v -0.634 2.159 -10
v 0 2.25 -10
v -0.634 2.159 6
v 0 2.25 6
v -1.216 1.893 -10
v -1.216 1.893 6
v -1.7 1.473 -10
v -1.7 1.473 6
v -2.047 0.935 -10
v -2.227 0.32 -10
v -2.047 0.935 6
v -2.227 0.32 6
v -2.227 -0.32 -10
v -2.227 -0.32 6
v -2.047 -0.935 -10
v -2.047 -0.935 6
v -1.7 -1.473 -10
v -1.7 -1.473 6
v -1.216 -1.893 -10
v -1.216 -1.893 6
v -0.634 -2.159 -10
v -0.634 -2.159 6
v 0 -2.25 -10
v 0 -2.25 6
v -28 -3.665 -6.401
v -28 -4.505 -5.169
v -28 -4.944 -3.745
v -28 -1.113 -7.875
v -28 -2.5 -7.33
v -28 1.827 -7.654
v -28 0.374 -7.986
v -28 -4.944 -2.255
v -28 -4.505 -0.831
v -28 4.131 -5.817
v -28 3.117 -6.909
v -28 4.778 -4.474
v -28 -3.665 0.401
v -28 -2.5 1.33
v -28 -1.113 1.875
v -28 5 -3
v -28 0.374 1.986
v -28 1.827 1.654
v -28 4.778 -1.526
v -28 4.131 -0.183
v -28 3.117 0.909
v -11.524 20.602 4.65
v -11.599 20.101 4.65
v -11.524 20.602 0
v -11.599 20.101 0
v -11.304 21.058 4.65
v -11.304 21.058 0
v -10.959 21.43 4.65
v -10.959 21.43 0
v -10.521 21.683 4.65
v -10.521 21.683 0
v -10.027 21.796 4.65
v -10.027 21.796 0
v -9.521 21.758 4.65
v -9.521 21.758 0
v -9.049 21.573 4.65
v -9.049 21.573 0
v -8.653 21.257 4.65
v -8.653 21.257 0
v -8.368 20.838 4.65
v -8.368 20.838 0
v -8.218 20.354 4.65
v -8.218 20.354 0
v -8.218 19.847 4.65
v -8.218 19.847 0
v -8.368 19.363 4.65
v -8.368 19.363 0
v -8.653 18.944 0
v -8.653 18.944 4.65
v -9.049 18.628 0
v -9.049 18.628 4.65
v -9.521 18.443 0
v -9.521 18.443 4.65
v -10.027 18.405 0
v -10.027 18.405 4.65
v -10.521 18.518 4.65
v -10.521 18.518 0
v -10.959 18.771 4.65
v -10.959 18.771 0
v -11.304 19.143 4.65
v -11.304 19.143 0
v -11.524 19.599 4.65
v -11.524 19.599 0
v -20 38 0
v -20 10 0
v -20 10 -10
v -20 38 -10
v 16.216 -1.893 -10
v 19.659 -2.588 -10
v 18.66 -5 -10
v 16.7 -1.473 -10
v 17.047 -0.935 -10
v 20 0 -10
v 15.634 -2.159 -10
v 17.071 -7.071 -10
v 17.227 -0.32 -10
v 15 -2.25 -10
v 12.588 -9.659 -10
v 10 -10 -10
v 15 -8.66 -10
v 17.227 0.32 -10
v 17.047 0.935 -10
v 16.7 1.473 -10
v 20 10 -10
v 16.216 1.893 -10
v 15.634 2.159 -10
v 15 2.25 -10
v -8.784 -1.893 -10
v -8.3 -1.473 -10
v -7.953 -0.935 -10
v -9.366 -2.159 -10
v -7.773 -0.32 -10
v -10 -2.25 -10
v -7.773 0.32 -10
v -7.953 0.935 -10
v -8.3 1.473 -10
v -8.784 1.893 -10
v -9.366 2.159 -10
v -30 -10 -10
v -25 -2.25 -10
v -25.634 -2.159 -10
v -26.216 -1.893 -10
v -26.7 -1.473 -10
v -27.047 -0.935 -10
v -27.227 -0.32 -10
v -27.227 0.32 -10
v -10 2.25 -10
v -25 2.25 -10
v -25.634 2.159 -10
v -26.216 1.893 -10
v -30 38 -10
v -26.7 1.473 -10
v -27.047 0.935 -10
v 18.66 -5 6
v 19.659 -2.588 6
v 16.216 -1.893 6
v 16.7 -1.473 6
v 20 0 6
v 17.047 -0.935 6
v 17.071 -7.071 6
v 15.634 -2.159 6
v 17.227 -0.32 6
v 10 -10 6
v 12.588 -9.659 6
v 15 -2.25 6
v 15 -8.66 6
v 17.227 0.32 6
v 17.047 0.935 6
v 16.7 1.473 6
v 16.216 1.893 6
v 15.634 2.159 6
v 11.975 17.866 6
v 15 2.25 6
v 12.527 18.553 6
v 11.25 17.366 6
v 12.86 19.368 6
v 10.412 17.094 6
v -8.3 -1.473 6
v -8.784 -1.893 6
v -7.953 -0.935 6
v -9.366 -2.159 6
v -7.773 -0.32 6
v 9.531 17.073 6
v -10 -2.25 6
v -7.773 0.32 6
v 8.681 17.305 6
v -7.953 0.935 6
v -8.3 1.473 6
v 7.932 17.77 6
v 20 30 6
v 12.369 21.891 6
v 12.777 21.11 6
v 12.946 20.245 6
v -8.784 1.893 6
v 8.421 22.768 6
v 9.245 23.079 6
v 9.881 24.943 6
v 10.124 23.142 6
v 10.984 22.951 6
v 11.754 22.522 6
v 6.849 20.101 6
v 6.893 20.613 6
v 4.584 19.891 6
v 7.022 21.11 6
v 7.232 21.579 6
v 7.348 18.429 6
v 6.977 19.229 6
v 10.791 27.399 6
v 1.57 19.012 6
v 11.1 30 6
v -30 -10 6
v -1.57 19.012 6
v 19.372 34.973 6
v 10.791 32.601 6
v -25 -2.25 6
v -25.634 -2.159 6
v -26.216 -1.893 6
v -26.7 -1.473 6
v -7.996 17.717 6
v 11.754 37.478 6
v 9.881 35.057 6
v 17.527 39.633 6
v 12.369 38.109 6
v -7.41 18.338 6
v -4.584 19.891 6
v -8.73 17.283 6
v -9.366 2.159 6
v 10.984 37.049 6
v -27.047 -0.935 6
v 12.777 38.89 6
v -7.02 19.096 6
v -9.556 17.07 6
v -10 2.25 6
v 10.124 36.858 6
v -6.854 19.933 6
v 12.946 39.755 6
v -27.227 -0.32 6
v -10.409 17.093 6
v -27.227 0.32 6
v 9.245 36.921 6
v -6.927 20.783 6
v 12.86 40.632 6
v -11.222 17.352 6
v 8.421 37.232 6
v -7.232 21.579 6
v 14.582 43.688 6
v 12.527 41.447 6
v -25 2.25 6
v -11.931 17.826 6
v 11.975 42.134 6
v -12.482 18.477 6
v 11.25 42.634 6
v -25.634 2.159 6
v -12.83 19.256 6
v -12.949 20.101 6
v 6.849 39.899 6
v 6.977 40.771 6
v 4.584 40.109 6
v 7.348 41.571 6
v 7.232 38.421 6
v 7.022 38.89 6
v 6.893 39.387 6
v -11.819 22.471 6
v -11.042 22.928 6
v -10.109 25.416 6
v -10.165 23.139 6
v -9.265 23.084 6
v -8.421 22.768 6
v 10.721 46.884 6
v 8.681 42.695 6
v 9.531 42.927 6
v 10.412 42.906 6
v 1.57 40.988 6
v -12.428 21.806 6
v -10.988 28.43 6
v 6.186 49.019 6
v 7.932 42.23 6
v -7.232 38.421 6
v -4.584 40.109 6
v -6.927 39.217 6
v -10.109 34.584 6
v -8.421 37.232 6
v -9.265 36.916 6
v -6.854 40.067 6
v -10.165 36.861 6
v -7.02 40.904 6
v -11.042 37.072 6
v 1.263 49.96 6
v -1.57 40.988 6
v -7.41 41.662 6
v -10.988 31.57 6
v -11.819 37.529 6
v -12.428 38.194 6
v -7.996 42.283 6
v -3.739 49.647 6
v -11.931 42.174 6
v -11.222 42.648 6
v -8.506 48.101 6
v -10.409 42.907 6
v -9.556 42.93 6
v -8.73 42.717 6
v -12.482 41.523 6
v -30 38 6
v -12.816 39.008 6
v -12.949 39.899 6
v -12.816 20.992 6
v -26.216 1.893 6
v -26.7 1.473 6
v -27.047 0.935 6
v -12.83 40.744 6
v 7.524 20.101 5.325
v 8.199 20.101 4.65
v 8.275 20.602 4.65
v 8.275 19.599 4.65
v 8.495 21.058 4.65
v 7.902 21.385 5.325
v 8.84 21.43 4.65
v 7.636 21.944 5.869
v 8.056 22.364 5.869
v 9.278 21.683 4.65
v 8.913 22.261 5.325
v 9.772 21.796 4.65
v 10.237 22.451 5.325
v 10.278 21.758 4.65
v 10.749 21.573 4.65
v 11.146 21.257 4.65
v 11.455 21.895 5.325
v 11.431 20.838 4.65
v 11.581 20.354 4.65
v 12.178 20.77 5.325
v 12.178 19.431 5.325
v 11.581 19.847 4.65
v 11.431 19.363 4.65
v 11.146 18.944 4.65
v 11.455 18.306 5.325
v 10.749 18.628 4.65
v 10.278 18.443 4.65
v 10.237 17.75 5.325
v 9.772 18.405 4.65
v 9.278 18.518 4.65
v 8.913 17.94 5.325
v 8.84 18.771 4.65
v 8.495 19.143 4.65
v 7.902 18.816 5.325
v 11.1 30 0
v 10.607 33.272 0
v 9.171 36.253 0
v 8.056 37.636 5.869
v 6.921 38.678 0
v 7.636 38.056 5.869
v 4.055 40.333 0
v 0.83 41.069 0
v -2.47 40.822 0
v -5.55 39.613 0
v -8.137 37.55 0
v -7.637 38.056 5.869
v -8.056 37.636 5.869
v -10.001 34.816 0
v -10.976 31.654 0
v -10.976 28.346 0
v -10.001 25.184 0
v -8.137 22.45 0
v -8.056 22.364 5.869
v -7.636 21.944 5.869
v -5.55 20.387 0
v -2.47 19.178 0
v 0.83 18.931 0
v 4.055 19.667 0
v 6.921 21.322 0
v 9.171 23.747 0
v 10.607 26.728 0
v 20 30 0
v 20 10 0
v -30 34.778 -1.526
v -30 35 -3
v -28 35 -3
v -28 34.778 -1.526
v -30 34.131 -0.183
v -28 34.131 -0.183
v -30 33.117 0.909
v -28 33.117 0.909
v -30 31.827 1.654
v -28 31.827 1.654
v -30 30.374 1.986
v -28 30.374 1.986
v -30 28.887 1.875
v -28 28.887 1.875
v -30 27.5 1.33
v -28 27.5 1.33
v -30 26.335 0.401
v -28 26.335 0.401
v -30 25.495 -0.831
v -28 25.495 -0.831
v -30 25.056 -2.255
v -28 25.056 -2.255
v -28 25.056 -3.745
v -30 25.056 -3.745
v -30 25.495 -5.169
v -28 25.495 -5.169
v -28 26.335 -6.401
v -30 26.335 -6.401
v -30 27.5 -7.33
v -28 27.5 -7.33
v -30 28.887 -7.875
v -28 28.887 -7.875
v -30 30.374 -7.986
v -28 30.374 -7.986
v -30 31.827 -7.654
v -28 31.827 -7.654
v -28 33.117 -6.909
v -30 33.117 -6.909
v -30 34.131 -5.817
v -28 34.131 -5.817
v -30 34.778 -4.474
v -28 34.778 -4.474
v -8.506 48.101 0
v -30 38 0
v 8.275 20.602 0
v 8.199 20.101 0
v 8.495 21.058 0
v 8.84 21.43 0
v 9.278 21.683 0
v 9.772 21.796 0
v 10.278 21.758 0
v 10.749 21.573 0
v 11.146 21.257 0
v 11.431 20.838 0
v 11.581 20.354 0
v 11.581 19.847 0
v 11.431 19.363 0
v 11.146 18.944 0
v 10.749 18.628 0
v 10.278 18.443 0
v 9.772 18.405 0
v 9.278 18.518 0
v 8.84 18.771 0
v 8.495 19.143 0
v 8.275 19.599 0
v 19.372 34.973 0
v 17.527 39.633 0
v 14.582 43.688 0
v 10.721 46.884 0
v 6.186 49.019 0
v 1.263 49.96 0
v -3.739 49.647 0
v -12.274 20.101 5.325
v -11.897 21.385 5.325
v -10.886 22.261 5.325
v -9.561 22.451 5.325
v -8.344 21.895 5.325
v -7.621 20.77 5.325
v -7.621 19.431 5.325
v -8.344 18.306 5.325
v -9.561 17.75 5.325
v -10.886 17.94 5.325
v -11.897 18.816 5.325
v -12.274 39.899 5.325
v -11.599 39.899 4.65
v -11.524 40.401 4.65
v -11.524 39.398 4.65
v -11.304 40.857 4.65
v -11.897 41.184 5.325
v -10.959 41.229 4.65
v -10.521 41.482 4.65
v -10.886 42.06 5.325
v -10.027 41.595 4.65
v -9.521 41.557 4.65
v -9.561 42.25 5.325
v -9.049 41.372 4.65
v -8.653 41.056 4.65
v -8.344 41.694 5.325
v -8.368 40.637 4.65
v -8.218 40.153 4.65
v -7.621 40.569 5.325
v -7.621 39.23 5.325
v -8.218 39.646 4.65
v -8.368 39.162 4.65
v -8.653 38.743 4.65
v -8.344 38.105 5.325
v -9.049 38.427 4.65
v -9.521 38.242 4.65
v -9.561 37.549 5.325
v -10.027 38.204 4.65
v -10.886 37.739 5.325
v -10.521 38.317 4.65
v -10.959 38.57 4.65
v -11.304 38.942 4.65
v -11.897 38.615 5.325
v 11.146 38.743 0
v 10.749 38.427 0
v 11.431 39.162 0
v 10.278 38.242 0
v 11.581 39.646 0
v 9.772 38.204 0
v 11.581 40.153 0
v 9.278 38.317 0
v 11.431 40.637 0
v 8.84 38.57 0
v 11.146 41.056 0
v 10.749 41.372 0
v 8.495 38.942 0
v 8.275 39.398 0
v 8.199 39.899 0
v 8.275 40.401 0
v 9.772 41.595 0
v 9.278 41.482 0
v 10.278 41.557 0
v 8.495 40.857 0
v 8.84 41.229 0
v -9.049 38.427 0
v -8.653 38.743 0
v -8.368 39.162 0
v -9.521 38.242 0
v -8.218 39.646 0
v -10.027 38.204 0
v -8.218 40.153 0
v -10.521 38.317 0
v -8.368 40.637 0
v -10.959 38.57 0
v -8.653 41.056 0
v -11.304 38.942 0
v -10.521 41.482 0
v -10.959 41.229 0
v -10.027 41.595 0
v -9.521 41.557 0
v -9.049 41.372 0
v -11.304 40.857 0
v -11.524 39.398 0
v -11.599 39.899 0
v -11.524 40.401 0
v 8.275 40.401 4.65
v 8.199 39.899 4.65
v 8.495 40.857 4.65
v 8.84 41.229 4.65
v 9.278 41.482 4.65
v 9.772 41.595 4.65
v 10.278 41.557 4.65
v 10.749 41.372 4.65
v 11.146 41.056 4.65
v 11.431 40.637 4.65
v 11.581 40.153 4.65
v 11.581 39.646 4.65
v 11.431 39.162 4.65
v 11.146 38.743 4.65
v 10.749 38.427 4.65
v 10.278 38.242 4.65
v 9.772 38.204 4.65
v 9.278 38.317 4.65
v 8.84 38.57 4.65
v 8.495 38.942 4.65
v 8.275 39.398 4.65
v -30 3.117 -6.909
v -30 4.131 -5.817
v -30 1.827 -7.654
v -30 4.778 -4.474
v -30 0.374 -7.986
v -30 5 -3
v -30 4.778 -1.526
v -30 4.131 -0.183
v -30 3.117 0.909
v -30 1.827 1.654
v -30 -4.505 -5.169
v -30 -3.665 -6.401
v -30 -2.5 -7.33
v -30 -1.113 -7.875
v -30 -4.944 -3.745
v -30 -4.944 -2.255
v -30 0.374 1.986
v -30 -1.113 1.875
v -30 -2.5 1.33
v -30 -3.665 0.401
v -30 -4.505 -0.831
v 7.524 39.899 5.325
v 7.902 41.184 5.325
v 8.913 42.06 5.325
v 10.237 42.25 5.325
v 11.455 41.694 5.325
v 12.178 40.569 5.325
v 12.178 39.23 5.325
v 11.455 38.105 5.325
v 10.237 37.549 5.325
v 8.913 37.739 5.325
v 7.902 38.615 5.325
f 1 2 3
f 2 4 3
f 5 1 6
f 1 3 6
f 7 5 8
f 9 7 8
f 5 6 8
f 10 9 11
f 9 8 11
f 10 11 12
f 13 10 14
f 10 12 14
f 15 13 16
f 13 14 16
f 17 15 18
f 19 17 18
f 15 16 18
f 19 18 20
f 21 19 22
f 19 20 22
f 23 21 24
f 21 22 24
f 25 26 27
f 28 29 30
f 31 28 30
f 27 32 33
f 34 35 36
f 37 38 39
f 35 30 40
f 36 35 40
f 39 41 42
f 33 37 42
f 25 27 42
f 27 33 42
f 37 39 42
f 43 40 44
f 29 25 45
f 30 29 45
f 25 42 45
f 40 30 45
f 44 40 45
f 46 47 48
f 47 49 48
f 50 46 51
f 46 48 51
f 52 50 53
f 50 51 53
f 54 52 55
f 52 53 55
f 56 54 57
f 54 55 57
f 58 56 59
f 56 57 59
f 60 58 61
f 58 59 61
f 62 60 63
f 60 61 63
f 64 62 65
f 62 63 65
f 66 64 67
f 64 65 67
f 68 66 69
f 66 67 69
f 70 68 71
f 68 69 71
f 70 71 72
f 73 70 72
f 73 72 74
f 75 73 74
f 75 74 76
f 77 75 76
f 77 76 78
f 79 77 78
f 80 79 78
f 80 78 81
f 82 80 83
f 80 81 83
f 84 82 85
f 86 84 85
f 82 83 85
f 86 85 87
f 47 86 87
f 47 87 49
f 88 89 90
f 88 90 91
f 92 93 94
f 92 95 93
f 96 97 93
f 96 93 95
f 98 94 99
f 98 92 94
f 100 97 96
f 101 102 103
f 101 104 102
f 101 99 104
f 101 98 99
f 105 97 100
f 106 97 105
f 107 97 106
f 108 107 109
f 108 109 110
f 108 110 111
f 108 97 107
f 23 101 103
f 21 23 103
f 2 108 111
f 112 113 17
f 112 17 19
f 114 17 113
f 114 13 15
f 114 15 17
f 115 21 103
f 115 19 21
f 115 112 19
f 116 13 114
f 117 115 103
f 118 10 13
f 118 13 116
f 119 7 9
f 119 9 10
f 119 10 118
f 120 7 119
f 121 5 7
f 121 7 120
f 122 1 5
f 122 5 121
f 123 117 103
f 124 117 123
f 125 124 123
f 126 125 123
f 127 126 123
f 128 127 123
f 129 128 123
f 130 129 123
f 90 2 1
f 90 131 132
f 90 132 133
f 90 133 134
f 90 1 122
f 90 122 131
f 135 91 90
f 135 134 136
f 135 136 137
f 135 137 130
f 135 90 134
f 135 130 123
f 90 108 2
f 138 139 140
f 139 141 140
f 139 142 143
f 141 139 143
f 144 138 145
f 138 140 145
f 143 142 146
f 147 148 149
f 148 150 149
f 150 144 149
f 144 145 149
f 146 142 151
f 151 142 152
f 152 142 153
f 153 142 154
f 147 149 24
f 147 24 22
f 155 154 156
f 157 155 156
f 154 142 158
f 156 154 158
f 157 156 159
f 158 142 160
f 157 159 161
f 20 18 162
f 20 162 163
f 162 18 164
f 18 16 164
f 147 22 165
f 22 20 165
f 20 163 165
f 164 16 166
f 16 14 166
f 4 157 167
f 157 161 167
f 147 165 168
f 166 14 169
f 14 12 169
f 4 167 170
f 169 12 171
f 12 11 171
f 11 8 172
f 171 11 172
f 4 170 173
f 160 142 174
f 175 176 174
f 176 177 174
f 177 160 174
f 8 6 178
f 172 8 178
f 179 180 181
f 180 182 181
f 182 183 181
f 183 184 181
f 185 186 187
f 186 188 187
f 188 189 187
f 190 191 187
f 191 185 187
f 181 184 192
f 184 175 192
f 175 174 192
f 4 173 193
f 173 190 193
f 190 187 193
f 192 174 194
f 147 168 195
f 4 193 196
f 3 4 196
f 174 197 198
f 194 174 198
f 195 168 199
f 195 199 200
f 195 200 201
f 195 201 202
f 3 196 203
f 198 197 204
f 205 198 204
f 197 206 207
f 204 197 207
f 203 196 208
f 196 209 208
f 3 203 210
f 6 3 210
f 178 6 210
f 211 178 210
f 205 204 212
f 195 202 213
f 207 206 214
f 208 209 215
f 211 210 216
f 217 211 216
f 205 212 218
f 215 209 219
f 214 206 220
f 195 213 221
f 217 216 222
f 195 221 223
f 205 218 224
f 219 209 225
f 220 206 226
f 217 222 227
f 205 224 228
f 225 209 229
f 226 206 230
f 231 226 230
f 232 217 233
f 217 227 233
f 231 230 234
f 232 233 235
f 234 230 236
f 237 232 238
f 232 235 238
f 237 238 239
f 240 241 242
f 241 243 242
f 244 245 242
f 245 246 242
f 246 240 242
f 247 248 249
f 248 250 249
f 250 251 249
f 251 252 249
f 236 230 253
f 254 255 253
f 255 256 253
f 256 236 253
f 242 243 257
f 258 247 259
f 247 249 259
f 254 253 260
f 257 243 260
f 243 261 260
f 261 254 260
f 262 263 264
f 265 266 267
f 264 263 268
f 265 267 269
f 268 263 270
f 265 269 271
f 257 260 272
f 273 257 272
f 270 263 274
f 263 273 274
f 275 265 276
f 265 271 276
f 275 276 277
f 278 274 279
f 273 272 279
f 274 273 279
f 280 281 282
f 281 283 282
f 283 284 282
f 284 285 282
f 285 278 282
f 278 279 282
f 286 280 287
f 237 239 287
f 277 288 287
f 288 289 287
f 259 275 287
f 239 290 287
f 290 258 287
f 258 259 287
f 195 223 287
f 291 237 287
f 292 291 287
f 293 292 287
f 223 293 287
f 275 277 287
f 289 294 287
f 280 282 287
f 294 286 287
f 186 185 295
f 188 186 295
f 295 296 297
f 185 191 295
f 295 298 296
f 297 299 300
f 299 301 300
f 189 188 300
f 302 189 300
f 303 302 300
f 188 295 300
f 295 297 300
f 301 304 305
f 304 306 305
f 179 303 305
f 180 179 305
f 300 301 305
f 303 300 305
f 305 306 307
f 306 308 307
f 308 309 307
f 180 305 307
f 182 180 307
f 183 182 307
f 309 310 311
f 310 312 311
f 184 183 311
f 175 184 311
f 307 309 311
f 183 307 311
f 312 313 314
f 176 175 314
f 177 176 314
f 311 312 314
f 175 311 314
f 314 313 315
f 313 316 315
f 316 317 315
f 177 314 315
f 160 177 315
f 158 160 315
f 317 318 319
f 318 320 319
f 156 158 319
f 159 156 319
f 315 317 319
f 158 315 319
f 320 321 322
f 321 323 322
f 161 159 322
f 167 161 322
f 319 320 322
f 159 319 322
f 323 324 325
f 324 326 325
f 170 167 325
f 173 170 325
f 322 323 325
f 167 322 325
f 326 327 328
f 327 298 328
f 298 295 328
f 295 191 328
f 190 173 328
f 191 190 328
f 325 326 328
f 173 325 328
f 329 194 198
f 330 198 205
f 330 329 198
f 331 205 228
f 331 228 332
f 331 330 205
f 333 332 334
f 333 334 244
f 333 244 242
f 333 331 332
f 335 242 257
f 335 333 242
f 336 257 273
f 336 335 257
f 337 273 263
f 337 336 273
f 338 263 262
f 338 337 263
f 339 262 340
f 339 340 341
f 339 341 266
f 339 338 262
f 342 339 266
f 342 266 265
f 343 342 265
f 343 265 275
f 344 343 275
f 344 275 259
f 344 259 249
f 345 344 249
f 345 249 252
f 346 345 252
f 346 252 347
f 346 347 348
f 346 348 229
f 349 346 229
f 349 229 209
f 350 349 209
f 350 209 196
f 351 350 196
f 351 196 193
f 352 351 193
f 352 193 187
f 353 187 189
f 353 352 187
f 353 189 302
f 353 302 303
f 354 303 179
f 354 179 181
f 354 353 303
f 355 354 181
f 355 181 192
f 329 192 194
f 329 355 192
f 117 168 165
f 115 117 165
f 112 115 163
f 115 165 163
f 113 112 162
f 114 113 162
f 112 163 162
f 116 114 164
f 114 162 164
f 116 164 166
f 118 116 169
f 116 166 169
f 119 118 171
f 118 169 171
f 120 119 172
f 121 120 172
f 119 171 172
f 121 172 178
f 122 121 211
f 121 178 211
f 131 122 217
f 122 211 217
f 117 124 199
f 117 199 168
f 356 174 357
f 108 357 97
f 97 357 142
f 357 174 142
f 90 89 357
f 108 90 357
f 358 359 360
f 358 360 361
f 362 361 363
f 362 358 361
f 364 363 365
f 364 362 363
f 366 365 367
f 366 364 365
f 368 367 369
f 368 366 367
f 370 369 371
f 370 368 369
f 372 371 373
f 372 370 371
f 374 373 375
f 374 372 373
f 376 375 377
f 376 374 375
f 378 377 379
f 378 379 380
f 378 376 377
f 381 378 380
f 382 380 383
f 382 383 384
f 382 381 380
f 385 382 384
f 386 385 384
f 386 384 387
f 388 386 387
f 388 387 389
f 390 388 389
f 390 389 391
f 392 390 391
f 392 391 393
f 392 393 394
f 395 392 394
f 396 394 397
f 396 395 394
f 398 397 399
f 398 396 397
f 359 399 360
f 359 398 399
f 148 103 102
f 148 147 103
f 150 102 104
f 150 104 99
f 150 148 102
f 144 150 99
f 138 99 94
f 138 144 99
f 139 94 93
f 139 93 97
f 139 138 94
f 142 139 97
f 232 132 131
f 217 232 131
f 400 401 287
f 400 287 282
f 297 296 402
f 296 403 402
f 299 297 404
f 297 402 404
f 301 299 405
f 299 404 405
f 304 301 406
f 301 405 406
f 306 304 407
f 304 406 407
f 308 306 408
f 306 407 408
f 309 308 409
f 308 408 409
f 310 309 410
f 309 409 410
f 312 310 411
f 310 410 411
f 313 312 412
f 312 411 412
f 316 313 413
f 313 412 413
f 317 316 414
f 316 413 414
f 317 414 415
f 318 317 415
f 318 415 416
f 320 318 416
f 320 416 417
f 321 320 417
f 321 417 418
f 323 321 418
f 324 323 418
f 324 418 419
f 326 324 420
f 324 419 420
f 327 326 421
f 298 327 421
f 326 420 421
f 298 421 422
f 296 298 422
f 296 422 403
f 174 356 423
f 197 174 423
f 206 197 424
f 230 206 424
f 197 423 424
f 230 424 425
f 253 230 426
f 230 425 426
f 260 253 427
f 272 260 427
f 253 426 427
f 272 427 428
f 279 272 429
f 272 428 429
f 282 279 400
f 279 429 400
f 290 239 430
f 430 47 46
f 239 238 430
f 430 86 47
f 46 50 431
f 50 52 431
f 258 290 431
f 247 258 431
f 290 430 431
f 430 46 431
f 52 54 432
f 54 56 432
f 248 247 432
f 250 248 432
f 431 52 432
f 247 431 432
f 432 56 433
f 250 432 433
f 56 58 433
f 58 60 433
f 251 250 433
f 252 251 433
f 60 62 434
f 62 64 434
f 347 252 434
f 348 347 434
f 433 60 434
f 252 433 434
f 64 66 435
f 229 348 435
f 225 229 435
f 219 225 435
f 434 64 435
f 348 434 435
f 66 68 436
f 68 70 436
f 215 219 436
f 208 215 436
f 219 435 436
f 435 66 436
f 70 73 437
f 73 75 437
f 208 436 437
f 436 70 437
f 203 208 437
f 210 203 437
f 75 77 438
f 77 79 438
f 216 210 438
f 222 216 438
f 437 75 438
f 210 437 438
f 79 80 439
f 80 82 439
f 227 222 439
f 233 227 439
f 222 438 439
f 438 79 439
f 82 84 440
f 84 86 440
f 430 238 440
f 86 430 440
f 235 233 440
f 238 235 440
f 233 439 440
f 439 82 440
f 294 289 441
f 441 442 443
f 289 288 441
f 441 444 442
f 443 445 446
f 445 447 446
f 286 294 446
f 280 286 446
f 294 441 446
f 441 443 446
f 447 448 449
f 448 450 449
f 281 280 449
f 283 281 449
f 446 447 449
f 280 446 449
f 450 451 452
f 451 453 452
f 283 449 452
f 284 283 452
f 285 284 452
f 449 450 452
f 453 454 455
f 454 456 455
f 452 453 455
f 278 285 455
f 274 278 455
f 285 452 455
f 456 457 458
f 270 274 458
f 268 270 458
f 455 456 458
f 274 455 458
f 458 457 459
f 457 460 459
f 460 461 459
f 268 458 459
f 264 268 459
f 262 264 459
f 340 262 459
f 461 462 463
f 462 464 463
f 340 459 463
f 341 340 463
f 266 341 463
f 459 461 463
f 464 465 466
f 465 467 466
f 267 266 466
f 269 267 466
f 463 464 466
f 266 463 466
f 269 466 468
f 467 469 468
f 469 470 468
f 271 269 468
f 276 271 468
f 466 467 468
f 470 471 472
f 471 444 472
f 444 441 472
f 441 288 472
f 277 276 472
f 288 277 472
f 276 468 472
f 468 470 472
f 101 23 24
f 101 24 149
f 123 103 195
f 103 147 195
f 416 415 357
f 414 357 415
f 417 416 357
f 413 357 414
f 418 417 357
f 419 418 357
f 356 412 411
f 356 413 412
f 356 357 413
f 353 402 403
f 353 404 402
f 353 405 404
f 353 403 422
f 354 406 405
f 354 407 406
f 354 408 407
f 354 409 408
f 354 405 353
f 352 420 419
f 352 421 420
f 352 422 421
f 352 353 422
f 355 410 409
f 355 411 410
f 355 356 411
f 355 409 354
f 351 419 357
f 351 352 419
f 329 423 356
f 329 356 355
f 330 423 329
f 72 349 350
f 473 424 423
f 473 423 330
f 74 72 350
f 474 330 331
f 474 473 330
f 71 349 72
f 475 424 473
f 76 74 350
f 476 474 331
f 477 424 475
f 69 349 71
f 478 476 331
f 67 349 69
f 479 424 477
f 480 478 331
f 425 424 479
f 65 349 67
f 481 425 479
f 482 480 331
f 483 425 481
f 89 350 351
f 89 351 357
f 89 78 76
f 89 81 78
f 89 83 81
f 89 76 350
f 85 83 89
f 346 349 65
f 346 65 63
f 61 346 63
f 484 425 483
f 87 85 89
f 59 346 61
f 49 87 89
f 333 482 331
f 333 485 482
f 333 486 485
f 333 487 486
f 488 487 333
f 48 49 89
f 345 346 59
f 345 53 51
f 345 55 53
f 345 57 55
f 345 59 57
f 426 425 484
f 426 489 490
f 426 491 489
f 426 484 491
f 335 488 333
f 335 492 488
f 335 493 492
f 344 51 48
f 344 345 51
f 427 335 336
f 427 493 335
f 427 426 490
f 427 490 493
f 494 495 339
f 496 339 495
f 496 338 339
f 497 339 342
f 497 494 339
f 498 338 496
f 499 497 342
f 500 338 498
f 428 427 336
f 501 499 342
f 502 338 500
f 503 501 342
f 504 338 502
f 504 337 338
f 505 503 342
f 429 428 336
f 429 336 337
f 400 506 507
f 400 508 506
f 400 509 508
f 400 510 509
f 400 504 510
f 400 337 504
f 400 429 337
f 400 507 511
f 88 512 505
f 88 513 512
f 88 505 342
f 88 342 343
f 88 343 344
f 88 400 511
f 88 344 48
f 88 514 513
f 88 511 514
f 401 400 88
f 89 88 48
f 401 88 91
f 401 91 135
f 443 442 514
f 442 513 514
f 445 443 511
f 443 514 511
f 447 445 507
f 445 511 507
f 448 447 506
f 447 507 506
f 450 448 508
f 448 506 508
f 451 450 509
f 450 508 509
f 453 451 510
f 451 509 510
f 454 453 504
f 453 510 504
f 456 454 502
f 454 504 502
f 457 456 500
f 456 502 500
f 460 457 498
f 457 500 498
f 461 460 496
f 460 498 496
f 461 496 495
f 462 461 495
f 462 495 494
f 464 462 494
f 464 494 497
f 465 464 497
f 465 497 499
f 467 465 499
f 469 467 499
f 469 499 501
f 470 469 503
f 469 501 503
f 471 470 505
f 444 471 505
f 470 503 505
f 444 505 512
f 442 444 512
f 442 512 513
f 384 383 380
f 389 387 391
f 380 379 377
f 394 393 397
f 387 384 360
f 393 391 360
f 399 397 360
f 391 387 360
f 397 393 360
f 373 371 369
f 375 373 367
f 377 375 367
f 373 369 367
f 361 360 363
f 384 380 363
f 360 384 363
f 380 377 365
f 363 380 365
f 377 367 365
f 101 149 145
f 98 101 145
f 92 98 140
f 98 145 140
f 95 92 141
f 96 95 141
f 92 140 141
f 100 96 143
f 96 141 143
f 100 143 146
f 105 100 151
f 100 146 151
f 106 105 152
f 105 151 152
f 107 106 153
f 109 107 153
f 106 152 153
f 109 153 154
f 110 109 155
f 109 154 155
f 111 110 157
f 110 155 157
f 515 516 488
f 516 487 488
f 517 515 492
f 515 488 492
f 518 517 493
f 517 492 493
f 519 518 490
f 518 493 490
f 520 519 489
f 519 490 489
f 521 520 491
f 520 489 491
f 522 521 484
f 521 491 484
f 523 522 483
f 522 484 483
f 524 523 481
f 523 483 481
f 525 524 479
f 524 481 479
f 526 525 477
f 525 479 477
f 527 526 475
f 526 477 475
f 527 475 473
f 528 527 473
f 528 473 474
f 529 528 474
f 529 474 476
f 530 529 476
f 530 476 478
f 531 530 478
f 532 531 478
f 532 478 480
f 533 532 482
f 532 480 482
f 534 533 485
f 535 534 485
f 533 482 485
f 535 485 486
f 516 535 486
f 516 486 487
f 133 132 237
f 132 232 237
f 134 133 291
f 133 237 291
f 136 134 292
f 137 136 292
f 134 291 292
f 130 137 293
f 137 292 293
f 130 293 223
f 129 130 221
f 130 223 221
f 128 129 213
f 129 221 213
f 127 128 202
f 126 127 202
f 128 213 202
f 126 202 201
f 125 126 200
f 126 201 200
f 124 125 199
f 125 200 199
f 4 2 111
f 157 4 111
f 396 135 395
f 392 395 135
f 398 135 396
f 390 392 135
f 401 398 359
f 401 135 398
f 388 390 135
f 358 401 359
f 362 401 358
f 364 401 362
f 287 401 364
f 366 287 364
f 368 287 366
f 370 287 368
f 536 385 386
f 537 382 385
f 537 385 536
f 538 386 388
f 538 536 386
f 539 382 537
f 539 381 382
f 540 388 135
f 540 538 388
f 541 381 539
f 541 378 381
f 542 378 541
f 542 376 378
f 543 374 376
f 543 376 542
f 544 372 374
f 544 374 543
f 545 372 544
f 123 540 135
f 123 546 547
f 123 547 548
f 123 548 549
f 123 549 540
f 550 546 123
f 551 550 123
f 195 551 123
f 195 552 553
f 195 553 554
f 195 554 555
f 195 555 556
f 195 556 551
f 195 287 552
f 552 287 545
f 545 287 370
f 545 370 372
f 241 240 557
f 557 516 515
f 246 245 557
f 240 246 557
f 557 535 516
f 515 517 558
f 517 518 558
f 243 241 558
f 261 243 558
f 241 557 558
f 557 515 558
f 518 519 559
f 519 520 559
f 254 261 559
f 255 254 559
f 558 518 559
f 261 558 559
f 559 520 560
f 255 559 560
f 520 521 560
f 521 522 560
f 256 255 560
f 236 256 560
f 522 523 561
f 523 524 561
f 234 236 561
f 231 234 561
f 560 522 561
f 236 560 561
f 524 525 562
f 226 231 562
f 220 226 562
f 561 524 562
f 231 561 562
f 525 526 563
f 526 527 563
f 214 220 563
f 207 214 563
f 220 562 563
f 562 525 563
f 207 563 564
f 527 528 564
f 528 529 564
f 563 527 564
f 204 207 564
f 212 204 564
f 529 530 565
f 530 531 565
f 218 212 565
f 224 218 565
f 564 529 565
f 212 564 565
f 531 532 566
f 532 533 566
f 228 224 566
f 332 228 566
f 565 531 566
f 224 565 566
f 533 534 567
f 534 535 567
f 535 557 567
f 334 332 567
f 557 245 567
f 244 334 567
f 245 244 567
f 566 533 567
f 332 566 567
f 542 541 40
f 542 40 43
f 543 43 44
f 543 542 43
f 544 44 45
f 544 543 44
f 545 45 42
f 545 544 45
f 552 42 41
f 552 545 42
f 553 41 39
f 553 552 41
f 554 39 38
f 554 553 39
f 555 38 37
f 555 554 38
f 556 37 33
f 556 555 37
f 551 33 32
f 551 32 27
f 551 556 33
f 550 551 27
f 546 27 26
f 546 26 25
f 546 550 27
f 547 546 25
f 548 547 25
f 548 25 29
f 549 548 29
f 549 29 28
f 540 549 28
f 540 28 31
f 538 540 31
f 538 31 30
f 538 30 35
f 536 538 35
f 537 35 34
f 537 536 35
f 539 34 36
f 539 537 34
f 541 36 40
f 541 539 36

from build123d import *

# Parameters (mm, degrees)
SKETCH030_R         = 11.1
SKETCH030_R_2       = 1.65
PAD018_DEPTH        = 6
PAD021_DEPTH        = 10
SKETCH032_R         = 5
POCKET013_DEPTH     = 2
HOLE004_D           = 3.4
HOLE004_CSINK_D     = 6.1
HOLE004_CSINK_ANGLE = 90


with BuildPart() as part:
    # Sketch030 → Pad018 (new body)
    with BuildSketch(Plane.XY):
        with BuildLine():
            Line((-30, -10), (-30, 10))
            Line((-30, 10), (-30, 38))
            Line((-30, 38), (-8.506442, 48.100841))
            ThreePointArc((20, 30), (10.720801, 46.883851), (-8.506442, 48.100841))
            Line((20, 30), (20, 0))
            ThreePointArc((10, -10), (17.071068, -7.071068), (20, 0))
            Line((10, -10), (-30, -10))
        make_face()
        with Locations((0, 30)):
            Circle(SKETCH030_R, mode=Mode.SUBTRACT)
        with Locations((-9.899495, 39.899495)):
            Circle(SKETCH030_R_2, mode=Mode.SUBTRACT)
        with Locations((9.899495, 39.899495)):
            Circle(SKETCH030_R_2, mode=Mode.SUBTRACT)
        with Locations((9.899495, 20.100505)):
            Circle(SKETCH030_R_2, mode=Mode.SUBTRACT)
        with Locations((-9.899495, 20.100505)):
            Circle(SKETCH030_R_2, mode=Mode.SUBTRACT)
        with BuildLine():
            ThreePointArc((-25, 2.25), (-27.25, 0), (-25, -2.25))
            Line((-25, -2.25), (-10, -2.25))
            ThreePointArc((-10, -2.25), (-7.75, 0), (-10, 2.25))
            Line((-25, 2.25), (-10, 2.25))
        make_face(mode=Mode.SUBTRACT)
        with BuildLine():
            ThreePointArc((0, 2.25), (-2.25, 0), (0, -2.25))
            Line((0, -2.25), (15, -2.25))
            ThreePointArc((15, -2.25), (17.25, 0), (15, 2.25))
            Line((0, 2.25), (15, 2.25))
        make_face(mode=Mode.SUBTRACT)
    extrude(amount=PAD018_DEPTH)

    # Sketch036 → Pad021 (join)
    with BuildSketch(Plane.XY):
        with BuildLine():
            Line((20, 10), (20, 0))
            ThreePointArc((10, -10), (17.071068, -7.071068), (20, 0))
            Line((10, -10), (-30, -10))
            Line((-30, -10), (-30, 10))
            Line((-30, 38), (-30, 10))
            Line((-20, 38), (-30, 38))
            Line((-20, 10), (-20, 38))
            Line((-20, 10), (20, 10))
        make_face()
        with BuildLine():
            ThreePointArc((-25, 2.25), (-27.25, 0), (-25, -2.25))
            Line((-25, -2.25), (-10, -2.25))
            ThreePointArc((-10, -2.25), (-7.75, 0), (-10, 2.25))
            Line((-25, 2.25), (-10, 2.25))
        make_face(mode=Mode.SUBTRACT)
        with BuildLine():
            ThreePointArc((0, 2.25), (-2.25, 0), (0, -2.25))
            Line((0, -2.25), (15, -2.25))
            ThreePointArc((15, -2.25), (17.25, 0), (15, 2.25))
            Line((0, 2.25), (15, 2.25))
        make_face(mode=Mode.SUBTRACT)
    extrude(amount=-PAD021_DEPTH)

    # Sketch032 → Pocket013 (cut)
    with BuildSketch(Plane.YZ.offset(-30)):
        with Locations((0, -3)):
            Circle(SKETCH032_R)
        with Locations((30, -3)):
            Circle(SKETCH032_R)
    extrude(amount=POCKET013_DEPTH, mode=Mode.SUBTRACT)

    # Hole004 (through all)
    with Locations(Plane.XY.offset(6)):
        with Locations((9.899495, 39.899495), (-9.899495, 39.899495), (-9.899495, 20.100505), (9.899495, 20.100505)):
            CounterSinkHole(HOLE004_D / 2, HOLE004_CSINK_D / 2, counter_sink_angle=HOLE004_CSINK_ANGLE)


solid = part.part
